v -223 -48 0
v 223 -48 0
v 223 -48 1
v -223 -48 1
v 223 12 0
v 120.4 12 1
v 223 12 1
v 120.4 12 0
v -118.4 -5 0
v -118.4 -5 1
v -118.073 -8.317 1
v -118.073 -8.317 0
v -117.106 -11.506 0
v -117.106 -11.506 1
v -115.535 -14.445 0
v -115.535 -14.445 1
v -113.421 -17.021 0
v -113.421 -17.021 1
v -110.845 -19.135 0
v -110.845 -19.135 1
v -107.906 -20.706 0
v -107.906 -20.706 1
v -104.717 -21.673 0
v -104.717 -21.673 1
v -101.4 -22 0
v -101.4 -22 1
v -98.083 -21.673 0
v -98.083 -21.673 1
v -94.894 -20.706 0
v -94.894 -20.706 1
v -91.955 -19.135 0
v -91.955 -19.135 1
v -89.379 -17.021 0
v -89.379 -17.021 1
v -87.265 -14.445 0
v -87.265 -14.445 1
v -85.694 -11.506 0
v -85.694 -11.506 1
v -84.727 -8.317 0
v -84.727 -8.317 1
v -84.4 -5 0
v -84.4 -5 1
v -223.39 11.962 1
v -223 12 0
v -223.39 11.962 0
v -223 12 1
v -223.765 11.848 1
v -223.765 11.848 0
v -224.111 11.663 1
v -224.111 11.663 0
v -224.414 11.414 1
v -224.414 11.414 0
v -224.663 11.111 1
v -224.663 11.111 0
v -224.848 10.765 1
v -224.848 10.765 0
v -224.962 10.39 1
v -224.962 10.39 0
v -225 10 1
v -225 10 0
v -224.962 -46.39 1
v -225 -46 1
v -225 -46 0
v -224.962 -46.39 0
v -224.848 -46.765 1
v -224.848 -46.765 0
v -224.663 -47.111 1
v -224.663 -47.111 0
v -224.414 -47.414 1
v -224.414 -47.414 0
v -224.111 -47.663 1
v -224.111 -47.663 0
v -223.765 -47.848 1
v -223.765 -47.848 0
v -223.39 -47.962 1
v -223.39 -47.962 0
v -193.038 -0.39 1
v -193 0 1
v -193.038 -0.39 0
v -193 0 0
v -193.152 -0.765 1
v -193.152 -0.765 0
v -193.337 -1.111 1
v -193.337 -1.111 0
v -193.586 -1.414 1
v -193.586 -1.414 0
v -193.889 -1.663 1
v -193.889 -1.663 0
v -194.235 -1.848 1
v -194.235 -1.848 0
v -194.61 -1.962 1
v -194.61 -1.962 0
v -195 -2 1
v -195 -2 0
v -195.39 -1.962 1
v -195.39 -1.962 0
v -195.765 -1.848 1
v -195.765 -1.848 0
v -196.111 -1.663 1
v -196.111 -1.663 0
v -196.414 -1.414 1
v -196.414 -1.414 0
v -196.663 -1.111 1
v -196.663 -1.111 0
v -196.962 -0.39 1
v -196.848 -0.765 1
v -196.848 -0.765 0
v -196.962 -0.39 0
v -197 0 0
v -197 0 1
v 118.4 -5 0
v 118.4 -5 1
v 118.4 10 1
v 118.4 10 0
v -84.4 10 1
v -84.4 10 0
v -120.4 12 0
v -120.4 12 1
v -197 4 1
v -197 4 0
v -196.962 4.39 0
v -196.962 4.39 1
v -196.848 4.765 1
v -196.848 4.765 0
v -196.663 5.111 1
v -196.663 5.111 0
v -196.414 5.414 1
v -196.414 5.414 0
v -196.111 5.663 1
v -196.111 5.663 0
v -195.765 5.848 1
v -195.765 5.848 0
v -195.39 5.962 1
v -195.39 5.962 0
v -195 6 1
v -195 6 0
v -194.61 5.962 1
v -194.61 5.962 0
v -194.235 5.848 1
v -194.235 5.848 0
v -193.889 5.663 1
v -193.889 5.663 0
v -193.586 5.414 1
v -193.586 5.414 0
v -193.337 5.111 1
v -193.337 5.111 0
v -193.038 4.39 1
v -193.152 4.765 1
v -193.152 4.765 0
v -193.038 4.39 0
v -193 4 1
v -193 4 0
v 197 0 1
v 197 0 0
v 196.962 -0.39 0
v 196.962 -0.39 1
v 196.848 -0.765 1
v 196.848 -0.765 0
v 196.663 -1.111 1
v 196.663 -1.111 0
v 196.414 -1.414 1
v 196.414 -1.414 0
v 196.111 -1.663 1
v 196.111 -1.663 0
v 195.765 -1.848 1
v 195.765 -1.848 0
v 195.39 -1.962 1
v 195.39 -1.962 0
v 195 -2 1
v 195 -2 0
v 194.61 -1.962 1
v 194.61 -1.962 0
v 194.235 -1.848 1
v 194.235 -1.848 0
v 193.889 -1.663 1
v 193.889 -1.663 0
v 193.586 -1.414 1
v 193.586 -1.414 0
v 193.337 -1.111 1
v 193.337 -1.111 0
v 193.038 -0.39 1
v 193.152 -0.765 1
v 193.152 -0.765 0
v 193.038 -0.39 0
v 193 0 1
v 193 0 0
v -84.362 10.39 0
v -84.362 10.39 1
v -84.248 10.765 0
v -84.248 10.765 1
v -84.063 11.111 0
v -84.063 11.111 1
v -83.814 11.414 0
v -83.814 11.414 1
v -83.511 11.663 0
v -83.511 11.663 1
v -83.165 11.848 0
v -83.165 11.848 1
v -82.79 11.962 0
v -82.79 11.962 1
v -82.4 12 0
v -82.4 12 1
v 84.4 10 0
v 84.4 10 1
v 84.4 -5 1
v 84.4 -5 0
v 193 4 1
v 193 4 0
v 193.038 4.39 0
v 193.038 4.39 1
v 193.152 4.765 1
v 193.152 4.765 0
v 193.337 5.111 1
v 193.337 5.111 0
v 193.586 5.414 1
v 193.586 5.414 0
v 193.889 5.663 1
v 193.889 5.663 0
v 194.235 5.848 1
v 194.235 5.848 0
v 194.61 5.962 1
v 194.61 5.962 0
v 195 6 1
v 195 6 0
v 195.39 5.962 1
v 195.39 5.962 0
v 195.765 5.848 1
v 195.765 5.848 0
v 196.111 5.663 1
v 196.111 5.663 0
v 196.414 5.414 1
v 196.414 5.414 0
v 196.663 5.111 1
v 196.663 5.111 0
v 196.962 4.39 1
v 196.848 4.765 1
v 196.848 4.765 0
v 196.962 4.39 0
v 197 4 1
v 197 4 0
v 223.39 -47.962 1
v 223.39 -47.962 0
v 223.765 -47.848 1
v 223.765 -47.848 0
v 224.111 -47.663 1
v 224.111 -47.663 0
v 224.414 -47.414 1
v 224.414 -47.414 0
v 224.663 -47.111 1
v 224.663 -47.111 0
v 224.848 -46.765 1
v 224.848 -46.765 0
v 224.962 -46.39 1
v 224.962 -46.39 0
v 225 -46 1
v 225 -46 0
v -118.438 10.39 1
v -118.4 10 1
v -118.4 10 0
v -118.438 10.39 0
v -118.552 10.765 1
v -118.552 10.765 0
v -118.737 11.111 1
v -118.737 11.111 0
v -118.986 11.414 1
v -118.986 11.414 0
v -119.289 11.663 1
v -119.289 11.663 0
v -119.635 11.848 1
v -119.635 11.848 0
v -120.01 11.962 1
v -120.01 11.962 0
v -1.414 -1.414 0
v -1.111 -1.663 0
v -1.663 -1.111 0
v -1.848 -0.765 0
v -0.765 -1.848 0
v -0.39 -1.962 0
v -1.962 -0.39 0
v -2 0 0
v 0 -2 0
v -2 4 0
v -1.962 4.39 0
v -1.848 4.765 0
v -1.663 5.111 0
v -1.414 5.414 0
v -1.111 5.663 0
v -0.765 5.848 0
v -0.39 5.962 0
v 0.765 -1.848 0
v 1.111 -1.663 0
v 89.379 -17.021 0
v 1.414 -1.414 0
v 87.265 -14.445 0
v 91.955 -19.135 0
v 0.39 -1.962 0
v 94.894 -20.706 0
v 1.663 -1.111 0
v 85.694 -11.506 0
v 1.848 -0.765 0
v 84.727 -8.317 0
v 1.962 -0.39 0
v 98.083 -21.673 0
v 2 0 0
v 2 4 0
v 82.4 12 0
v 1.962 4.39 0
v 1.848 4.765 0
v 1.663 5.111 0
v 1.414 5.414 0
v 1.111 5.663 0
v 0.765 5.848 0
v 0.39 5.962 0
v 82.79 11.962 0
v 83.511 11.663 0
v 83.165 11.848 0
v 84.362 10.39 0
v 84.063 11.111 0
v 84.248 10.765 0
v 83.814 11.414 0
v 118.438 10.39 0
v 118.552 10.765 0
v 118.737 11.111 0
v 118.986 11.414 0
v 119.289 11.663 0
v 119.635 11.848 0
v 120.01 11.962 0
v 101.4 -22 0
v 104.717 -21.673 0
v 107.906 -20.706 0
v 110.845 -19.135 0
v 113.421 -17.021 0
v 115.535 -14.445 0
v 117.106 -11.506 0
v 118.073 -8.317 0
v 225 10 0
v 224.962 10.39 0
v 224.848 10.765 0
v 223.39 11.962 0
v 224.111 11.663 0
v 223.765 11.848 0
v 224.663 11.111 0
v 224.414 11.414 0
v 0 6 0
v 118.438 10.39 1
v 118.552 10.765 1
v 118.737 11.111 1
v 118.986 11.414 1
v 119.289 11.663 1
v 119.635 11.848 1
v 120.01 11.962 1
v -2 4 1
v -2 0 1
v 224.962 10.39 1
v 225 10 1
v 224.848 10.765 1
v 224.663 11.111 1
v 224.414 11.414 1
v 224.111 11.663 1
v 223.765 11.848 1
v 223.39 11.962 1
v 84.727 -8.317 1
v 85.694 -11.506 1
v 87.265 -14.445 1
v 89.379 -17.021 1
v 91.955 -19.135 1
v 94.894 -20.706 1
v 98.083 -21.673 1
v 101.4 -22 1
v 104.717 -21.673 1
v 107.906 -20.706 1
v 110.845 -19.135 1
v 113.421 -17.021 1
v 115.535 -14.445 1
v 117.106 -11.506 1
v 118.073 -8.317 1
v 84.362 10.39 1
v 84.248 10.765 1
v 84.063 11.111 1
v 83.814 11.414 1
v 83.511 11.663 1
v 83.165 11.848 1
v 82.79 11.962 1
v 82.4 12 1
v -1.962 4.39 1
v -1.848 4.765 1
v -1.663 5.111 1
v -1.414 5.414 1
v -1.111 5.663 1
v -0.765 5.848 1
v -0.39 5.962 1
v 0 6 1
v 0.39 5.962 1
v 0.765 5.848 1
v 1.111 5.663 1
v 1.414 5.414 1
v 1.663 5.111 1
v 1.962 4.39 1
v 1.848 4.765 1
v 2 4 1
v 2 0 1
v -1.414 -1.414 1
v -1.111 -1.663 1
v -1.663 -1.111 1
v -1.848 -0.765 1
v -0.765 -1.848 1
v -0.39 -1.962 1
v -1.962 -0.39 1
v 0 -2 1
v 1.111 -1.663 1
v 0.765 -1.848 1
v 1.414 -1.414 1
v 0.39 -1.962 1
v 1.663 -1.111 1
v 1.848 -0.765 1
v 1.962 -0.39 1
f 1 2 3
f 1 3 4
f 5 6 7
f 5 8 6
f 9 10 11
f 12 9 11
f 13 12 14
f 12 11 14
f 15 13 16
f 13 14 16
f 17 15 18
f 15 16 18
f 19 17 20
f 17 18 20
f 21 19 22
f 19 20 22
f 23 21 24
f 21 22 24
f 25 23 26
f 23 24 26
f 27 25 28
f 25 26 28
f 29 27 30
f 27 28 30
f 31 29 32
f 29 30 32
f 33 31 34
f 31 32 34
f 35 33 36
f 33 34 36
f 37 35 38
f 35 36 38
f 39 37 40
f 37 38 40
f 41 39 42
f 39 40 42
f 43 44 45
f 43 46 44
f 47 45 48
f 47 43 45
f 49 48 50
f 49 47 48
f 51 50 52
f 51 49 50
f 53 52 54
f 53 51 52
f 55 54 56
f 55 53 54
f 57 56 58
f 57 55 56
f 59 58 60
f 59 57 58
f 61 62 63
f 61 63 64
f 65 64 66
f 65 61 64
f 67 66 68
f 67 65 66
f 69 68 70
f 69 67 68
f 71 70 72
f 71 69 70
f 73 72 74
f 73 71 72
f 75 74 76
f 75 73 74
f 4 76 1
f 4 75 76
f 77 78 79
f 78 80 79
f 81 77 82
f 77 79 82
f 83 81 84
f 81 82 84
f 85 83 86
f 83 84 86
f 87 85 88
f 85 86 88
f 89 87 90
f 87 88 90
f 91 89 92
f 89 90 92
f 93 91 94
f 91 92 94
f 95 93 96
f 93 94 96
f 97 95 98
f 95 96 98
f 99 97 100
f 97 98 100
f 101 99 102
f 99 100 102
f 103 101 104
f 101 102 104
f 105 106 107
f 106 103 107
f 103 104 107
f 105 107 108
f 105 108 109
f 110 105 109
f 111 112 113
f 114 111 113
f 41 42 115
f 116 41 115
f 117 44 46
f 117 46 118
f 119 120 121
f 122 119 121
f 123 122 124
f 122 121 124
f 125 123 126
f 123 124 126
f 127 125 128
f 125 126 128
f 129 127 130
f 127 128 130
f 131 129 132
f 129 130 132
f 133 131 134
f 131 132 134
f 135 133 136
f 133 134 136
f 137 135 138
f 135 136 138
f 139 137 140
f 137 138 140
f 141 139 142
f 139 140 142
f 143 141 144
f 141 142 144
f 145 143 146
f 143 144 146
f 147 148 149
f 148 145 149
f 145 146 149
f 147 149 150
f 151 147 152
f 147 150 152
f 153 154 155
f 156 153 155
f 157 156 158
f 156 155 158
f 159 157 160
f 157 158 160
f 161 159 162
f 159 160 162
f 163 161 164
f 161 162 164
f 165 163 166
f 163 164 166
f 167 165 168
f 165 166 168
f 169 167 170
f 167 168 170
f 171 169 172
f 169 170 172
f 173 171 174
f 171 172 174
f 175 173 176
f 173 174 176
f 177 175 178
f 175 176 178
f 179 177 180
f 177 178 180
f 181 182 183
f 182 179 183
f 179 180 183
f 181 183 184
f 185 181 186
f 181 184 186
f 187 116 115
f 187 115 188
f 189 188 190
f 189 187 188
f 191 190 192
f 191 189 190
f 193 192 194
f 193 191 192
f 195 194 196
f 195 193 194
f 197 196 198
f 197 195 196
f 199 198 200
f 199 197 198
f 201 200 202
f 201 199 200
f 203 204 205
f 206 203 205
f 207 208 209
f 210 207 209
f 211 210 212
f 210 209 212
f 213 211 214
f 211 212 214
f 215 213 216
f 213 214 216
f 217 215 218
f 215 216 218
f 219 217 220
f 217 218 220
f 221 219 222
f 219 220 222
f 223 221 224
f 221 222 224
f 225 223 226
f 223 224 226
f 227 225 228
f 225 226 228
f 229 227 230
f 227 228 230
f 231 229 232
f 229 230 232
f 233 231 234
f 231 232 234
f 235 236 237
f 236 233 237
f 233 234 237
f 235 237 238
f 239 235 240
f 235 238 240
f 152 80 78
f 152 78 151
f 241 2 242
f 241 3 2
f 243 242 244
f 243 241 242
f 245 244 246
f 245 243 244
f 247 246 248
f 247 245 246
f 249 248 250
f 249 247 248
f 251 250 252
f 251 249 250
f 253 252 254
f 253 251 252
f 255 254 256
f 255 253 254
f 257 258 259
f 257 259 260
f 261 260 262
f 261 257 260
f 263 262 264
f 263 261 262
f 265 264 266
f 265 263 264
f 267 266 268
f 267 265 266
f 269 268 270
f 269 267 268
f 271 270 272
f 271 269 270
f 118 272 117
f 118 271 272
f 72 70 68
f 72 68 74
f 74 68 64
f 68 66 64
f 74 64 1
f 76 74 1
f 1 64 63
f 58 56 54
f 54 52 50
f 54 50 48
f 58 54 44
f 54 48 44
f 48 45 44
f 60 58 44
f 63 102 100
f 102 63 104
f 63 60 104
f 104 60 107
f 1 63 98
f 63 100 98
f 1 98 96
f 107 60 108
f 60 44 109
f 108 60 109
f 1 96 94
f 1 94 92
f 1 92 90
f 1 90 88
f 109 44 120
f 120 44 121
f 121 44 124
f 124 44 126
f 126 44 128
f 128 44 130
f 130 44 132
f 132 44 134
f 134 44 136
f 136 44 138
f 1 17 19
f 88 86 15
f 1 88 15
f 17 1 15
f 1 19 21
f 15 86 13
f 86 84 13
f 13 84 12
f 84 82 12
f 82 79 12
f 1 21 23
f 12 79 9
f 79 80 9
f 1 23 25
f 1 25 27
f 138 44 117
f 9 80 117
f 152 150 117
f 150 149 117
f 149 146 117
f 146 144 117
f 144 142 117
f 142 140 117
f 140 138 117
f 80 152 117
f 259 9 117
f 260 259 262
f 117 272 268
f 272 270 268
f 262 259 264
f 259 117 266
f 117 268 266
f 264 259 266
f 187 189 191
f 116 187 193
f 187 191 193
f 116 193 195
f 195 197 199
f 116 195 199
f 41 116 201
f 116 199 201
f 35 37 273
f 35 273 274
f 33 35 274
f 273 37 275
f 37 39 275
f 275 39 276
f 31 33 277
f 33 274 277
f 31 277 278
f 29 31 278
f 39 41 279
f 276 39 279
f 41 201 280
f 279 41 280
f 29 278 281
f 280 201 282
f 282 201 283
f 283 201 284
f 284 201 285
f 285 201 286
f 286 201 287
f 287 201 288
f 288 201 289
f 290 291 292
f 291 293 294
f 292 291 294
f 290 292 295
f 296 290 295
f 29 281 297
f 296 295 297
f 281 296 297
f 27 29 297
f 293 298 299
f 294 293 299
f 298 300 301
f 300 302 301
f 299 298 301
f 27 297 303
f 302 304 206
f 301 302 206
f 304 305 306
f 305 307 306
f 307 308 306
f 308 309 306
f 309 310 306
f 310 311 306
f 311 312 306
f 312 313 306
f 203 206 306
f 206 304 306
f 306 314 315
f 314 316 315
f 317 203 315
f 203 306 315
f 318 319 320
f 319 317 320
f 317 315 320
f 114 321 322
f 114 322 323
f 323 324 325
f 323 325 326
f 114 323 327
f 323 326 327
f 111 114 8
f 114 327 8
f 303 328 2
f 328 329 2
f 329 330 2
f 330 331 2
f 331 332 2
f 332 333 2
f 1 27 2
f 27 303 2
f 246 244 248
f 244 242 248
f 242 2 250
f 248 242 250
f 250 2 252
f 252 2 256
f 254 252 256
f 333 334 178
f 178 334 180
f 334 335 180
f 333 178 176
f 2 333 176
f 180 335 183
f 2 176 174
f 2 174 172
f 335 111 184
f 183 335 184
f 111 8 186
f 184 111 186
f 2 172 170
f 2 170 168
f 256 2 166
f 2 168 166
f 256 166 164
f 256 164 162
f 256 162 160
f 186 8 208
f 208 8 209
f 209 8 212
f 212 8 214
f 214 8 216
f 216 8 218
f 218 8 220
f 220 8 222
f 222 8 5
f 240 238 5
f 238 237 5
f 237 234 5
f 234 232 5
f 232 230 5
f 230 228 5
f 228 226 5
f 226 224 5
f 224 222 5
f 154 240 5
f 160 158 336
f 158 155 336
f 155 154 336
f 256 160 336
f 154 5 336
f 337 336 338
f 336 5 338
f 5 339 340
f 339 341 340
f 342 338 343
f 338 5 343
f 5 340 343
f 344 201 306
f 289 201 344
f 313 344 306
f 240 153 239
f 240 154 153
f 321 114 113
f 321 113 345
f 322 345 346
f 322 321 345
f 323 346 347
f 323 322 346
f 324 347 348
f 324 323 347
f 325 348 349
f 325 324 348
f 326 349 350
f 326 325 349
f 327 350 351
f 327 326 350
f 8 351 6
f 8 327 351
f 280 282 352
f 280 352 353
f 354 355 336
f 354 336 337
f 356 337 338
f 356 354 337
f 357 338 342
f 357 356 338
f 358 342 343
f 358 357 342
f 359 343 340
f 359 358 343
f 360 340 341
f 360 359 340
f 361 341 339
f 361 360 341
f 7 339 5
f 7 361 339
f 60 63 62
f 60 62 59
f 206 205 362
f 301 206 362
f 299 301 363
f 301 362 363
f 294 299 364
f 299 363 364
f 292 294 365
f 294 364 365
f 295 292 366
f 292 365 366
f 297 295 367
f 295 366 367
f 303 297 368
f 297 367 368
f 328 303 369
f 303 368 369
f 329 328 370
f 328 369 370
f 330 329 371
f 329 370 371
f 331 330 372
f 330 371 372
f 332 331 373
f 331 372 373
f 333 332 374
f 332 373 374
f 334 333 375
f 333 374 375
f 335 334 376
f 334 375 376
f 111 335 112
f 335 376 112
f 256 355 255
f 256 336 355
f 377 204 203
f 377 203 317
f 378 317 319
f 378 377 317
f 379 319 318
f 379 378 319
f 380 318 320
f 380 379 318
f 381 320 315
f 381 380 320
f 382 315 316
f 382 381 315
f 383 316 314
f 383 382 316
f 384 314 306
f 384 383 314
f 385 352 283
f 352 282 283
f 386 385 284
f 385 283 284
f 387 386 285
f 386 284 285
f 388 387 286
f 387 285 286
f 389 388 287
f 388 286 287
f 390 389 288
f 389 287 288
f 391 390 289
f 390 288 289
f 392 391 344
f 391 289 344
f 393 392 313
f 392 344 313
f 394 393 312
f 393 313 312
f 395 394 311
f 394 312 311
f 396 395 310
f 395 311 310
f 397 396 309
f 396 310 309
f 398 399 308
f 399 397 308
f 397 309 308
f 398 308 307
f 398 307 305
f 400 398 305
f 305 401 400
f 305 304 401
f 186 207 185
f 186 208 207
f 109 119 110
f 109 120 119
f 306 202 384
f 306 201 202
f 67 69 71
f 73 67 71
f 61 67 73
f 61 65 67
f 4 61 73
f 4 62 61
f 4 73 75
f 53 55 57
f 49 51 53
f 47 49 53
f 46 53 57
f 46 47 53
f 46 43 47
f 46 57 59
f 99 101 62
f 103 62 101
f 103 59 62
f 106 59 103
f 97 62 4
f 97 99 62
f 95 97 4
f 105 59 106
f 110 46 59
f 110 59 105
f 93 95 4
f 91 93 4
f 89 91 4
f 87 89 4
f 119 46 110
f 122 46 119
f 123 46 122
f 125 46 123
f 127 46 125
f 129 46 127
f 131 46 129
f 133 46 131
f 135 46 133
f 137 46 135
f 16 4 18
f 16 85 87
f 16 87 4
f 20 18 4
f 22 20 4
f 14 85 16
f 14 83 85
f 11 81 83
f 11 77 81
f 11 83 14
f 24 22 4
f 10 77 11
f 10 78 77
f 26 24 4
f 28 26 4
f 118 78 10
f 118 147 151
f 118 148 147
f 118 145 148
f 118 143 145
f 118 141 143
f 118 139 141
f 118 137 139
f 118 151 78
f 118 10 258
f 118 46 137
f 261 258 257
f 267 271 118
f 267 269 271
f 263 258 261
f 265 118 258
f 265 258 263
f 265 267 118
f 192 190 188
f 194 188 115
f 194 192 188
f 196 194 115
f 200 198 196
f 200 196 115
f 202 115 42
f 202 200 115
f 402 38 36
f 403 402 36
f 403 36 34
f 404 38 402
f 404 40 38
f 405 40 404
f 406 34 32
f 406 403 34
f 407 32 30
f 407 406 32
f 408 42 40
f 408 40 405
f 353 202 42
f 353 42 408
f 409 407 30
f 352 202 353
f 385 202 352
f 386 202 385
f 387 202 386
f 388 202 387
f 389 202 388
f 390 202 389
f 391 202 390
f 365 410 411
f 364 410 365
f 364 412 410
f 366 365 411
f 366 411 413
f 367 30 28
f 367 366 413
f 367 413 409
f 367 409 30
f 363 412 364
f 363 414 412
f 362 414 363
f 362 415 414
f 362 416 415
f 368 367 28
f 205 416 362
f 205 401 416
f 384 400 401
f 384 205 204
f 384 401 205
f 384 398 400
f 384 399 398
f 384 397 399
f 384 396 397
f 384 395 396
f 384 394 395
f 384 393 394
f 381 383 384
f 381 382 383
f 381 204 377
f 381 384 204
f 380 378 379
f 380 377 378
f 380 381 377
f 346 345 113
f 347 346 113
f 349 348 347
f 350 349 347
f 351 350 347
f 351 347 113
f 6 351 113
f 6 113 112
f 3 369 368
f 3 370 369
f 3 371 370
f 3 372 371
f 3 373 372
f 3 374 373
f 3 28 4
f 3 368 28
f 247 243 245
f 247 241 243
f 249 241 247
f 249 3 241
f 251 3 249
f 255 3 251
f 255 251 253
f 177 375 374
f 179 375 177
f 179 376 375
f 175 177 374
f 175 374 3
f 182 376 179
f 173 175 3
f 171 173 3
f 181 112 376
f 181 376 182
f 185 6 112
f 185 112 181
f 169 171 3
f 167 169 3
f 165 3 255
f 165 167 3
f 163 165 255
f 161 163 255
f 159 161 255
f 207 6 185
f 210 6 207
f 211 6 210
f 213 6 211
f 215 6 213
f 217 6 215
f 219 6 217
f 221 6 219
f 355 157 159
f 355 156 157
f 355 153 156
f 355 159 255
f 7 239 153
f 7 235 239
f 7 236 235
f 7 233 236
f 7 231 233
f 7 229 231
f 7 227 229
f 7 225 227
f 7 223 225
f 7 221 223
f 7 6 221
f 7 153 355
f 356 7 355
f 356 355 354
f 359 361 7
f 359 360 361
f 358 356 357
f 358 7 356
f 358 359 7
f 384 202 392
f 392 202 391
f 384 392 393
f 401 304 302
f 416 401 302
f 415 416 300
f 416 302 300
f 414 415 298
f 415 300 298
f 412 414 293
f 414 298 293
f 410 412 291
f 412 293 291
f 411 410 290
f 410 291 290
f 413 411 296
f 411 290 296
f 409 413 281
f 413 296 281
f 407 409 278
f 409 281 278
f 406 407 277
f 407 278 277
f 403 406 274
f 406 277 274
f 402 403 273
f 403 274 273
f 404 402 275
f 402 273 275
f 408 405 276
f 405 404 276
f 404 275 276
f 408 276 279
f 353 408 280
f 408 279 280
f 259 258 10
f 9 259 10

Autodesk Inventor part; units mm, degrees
ref_plane "YZ Plane" through (0, 0, 0) normal (1, 0, 0) x (0, 1, 0)
ref_plane "XZ Plane" through (0, 0, 0) normal (0, 1, 0) x (-1, 0, 0)
ref_plane "XY Plane" through (0, 0, 0) normal (0, 0, 1) x (1, 0, 0)
sketch "Sketch1" plane through (0, 0, 0) normal (0, 0, 1) x (1, 0, 0)
  circle A0 centre (0, 4) radius 2 construction
  circle A1 centre (-195, 4) radius 2 construction
  circle A2 centre (195, 4) radius 2 construction
  arc A3 (213, -12) -> (215, -10) centre (213, -10) ccw construction
  line L0 (215, -10) -> (215, 10) construction
  arc A4 (215, 10) -> (213, 12) centre (213, 10) ccw construction
  line L1 (213, 12) -> (-213, 12) construction
  line L2 (94, -2.8) -> (94, -7.2) construction
  line L3 (94, -7.2) -> (87.6, -7.2) construction
  line L4 (87.6, -7.2) -> (87.6, -2.8) construction
  line L5 (87.6, -2.8) -> (94, -2.8) construction
  line L6 (-108.8, -2.8) -> (-108.8, -7.2) construction
  line L7 (-108.8, -7.2) -> (-115.2, -7.2) construction
  line L8 (-115.2, -7.2) -> (-115.2, -2.8) construction
  line L9 (-115.2, -2.8) -> (-108.8, -2.8) construction
  line L10 (115.2, -2.8) -> (115.2, -7.2) construction
  line L11 (115.2, -7.2) -> (108.8, -7.2) construction
  line L12 (108.8, -7.2) -> (108.8, -2.8) construction
  line L13 (108.8, -2.8) -> (115.2, -2.8) construction
  line L14 (-87.6, -2.8) -> (-87.6, -7.2) construction
  line L15 (-87.6, -7.2) -> (-94, -7.2) construction
  line L16 (-94, -7.2) -> (-94, -2.8) construction
  line L17 (-94, -2.8) -> (-87.6, -2.8) construction
  circle A5 centre (-101.4, -5) radius 1.6 construction
  circle A6 centre (101.4, -5) radius 1.6 construction
  line L18 (213.9083, -46) -> (-214.0917, -46) construction
  line L19 (-225, 12) -> (225, 12)
  line L20 (225, 12) -> (225, -46)
  line L21 (-225, -46) -> (-225, 12)
  line L22 (-225, -46) -> (225, -46)
  line L23 (197, -54.5741) -> (193, -54.5741)
  line L24 (2, -54.5741) -> (-2, -54.5741)
  line L25 (-195, -54.5741) -> (-197, -54.5741)
  line L26 (-108.8, -54.5741) -> (-115.2, -54.5741)
  line L27 (94, -54.5741) -> (87.6, -54.5741)
  line L28 (-225, -46) -> (225, -46)
  line L29 (225, -46) -> (225, -48)
  line L30 (225, -48) -> (-225, -48)
  line L31 (-225, -48) -> (-225, -46)
  line L32 (-195, 4) -> (-195, 0) construction
  line L33 (-197, 4) -> (-197, 0)
  line L34 (-193, 0) -> (-193, 4)
  arc A7 (-193, 4) -> (-197, 4) centre (-195, 4) ccw
  arc A8 (-197, 0) -> (-193, 0) centre (-195, 0) ccw
  line L35 (0, 4) -> (0, 0) construction
  line L36 (-2, 4) -> (-2, 0)
  line L37 (2, 0) -> (2, 4)
  arc A9 (2, 4) -> (-2, 4) centre (0, 4) ccw
  arc A10 (-2, 0) -> (2, 0) centre (0, 0) ccw
  line L38 (195, 4) -> (195, 0) construction
  line L39 (193, 4) -> (193, 0)
  line L40 (197, 0) -> (197, 4)
  arc A11 (197, 4) -> (193, 4) centre (195, 4) ccw
  arc A12 (193, 0) -> (197, 0) centre (195, 0) ccw
  circle A13 centre (0, 4) radius 2 construction
  circle A14 centre (-195, 4) radius 2 construction
  circle A15 centre (195, 4) radius 2 construction
  arc A16 (213, -12) -> (215, -10) centre (213, -10) ccw construction
  line L41 (215, -10) -> (215, 10) construction
  arc A17 (215, 10) -> (213, 12) centre (213, 10) ccw construction
  line L42 (213, 12) -> (-213, 12) construction
  arc A18 (-213, 12) -> (-215, 10) centre (-213, 10) ccw construction
  line L43 (-215, 10) -> (-215, -10) construction
  arc A19 (-215, -10) -> (-213, -12) centre (-213, -10) ccw construction
  line L44 (-213, -12) -> (213, -12) construction
  line L45 (94, -2.8) -> (94, -7.2) construction
  line L46 (94, -7.2) -> (87.6, -7.2) construction
  line L47 (87.6, -7.2) -> (87.6, -2.8) construction
  line L48 (87.6, -2.8) -> (94, -2.8) construction
  line L49 (-108.8, -2.8) -> (-108.8, -7.2) construction
  line L50 (-108.8, -7.2) -> (-115.2, -7.2) construction
  line L51 (-115.2, -7.2) -> (-115.2, -2.8) construction
  line L52 (-115.2, -2.8) -> (-108.8, -2.8) construction
  line L53 (115.2, -2.8) -> (115.2, -7.2) construction
  line L54 (115.2, -7.2) -> (108.8, -7.2) construction
  line L55 (108.8, -7.2) -> (108.8, -2.8) construction
  line L56 (108.8, -2.8) -> (115.2, -2.8) construction
  line L57 (-87.6, -2.8) -> (-87.6, -7.2) construction
  line L58 (-87.6, -7.2) -> (-94, -7.2) construction
  line L59 (-94, -7.2) -> (-94, -2.8) construction
  line L60 (-94, -2.8) -> (-87.6, -2.8) construction
  circle A20 centre (-101.4, -5) radius 1.6 construction
  circle A21 centre (101.4, -5) radius 1.6 construction
  point P0 (-213, -12)
  point P1 (-195, 2)
  point P2 (0, 2)
  point P3 (195, 2)
  dimension "d0" = 2
  dimension "d1" = 58
  dimension "d5" = 4
  dimension "d6" = 4
  dimension "d7" = 4
  dimension "d17" = 10
  dimension "d18" = 10
extrude "Extrusion2" add sketch "Sketch1" along normal blind 1
fillet "Fillet2" radius 2 4 edges at (-225, -48, 0.5) (-225, 12, 0.5) (225, 12, 0.5) (225, -48, 0.5)
sketch "Sketch2" plane through (0, 0, 1) normal (0, 0, 1) x (1, 0, 0)
  circle A0 centre (-101.4, -5) radius 1.6 projected
  circle A1 centre (101.4, -5) radius 1.6 projected
  line L0 (115, -3) -> (115, -7) projected
  line L1 (87.6, -7.2) -> (87.6, -2.8) projected
  line L2 (-87.8, -3) -> (-87.8, -7) projected
  line L3 (-115, -3) -> (-115, -7) projected
  line L4 (-101.4, 24.0788) -> (-101.4, -5) construction
  line L5 (-118.4, 24.0788) -> (-118.4, -5)
  line L6 (-84.4, -5) -> (-84.4, 24.0788)
  arc A2 (-84.4, 24.0788) -> (-118.4, 24.0788) centre (-101.4, 24.0788) ccw
  arc A3 (-118.4, -5) -> (-84.4, -5) centre (-101.4, -5) ccw
  line L7 (101.4, 38.8521) -> (101.4, -5) construction
  line L8 (84.4, 38.8521) -> (84.4, -5)
  line L9 (118.4, -5) -> (118.4, 38.8521)
  arc A4 (118.4, 38.8521) -> (84.4, 38.8521) centre (101.4, 38.8521) ccw
  arc A5 (84.4, -5) -> (118.4, -5) centre (101.4, -5) ccw
  point P0 (-101.4, 9.5394)
  point P1 (101.4, 16.926)
  dimension "d13" = 17
extrude "Extrusion3" cut sketch "Sketch2" against normal blind 1 contours A0 | A1 | A2 L6 A3 L5 | A4 L9 A5 L8
fillet "Fillet3" radius 2 4 edges at (-118.4, 12, 0.5) (-84.4, 12, 0.5) (84.4, 12, 0.5) (118.4, 12, 0.5)
properties part number "wiper 2"
